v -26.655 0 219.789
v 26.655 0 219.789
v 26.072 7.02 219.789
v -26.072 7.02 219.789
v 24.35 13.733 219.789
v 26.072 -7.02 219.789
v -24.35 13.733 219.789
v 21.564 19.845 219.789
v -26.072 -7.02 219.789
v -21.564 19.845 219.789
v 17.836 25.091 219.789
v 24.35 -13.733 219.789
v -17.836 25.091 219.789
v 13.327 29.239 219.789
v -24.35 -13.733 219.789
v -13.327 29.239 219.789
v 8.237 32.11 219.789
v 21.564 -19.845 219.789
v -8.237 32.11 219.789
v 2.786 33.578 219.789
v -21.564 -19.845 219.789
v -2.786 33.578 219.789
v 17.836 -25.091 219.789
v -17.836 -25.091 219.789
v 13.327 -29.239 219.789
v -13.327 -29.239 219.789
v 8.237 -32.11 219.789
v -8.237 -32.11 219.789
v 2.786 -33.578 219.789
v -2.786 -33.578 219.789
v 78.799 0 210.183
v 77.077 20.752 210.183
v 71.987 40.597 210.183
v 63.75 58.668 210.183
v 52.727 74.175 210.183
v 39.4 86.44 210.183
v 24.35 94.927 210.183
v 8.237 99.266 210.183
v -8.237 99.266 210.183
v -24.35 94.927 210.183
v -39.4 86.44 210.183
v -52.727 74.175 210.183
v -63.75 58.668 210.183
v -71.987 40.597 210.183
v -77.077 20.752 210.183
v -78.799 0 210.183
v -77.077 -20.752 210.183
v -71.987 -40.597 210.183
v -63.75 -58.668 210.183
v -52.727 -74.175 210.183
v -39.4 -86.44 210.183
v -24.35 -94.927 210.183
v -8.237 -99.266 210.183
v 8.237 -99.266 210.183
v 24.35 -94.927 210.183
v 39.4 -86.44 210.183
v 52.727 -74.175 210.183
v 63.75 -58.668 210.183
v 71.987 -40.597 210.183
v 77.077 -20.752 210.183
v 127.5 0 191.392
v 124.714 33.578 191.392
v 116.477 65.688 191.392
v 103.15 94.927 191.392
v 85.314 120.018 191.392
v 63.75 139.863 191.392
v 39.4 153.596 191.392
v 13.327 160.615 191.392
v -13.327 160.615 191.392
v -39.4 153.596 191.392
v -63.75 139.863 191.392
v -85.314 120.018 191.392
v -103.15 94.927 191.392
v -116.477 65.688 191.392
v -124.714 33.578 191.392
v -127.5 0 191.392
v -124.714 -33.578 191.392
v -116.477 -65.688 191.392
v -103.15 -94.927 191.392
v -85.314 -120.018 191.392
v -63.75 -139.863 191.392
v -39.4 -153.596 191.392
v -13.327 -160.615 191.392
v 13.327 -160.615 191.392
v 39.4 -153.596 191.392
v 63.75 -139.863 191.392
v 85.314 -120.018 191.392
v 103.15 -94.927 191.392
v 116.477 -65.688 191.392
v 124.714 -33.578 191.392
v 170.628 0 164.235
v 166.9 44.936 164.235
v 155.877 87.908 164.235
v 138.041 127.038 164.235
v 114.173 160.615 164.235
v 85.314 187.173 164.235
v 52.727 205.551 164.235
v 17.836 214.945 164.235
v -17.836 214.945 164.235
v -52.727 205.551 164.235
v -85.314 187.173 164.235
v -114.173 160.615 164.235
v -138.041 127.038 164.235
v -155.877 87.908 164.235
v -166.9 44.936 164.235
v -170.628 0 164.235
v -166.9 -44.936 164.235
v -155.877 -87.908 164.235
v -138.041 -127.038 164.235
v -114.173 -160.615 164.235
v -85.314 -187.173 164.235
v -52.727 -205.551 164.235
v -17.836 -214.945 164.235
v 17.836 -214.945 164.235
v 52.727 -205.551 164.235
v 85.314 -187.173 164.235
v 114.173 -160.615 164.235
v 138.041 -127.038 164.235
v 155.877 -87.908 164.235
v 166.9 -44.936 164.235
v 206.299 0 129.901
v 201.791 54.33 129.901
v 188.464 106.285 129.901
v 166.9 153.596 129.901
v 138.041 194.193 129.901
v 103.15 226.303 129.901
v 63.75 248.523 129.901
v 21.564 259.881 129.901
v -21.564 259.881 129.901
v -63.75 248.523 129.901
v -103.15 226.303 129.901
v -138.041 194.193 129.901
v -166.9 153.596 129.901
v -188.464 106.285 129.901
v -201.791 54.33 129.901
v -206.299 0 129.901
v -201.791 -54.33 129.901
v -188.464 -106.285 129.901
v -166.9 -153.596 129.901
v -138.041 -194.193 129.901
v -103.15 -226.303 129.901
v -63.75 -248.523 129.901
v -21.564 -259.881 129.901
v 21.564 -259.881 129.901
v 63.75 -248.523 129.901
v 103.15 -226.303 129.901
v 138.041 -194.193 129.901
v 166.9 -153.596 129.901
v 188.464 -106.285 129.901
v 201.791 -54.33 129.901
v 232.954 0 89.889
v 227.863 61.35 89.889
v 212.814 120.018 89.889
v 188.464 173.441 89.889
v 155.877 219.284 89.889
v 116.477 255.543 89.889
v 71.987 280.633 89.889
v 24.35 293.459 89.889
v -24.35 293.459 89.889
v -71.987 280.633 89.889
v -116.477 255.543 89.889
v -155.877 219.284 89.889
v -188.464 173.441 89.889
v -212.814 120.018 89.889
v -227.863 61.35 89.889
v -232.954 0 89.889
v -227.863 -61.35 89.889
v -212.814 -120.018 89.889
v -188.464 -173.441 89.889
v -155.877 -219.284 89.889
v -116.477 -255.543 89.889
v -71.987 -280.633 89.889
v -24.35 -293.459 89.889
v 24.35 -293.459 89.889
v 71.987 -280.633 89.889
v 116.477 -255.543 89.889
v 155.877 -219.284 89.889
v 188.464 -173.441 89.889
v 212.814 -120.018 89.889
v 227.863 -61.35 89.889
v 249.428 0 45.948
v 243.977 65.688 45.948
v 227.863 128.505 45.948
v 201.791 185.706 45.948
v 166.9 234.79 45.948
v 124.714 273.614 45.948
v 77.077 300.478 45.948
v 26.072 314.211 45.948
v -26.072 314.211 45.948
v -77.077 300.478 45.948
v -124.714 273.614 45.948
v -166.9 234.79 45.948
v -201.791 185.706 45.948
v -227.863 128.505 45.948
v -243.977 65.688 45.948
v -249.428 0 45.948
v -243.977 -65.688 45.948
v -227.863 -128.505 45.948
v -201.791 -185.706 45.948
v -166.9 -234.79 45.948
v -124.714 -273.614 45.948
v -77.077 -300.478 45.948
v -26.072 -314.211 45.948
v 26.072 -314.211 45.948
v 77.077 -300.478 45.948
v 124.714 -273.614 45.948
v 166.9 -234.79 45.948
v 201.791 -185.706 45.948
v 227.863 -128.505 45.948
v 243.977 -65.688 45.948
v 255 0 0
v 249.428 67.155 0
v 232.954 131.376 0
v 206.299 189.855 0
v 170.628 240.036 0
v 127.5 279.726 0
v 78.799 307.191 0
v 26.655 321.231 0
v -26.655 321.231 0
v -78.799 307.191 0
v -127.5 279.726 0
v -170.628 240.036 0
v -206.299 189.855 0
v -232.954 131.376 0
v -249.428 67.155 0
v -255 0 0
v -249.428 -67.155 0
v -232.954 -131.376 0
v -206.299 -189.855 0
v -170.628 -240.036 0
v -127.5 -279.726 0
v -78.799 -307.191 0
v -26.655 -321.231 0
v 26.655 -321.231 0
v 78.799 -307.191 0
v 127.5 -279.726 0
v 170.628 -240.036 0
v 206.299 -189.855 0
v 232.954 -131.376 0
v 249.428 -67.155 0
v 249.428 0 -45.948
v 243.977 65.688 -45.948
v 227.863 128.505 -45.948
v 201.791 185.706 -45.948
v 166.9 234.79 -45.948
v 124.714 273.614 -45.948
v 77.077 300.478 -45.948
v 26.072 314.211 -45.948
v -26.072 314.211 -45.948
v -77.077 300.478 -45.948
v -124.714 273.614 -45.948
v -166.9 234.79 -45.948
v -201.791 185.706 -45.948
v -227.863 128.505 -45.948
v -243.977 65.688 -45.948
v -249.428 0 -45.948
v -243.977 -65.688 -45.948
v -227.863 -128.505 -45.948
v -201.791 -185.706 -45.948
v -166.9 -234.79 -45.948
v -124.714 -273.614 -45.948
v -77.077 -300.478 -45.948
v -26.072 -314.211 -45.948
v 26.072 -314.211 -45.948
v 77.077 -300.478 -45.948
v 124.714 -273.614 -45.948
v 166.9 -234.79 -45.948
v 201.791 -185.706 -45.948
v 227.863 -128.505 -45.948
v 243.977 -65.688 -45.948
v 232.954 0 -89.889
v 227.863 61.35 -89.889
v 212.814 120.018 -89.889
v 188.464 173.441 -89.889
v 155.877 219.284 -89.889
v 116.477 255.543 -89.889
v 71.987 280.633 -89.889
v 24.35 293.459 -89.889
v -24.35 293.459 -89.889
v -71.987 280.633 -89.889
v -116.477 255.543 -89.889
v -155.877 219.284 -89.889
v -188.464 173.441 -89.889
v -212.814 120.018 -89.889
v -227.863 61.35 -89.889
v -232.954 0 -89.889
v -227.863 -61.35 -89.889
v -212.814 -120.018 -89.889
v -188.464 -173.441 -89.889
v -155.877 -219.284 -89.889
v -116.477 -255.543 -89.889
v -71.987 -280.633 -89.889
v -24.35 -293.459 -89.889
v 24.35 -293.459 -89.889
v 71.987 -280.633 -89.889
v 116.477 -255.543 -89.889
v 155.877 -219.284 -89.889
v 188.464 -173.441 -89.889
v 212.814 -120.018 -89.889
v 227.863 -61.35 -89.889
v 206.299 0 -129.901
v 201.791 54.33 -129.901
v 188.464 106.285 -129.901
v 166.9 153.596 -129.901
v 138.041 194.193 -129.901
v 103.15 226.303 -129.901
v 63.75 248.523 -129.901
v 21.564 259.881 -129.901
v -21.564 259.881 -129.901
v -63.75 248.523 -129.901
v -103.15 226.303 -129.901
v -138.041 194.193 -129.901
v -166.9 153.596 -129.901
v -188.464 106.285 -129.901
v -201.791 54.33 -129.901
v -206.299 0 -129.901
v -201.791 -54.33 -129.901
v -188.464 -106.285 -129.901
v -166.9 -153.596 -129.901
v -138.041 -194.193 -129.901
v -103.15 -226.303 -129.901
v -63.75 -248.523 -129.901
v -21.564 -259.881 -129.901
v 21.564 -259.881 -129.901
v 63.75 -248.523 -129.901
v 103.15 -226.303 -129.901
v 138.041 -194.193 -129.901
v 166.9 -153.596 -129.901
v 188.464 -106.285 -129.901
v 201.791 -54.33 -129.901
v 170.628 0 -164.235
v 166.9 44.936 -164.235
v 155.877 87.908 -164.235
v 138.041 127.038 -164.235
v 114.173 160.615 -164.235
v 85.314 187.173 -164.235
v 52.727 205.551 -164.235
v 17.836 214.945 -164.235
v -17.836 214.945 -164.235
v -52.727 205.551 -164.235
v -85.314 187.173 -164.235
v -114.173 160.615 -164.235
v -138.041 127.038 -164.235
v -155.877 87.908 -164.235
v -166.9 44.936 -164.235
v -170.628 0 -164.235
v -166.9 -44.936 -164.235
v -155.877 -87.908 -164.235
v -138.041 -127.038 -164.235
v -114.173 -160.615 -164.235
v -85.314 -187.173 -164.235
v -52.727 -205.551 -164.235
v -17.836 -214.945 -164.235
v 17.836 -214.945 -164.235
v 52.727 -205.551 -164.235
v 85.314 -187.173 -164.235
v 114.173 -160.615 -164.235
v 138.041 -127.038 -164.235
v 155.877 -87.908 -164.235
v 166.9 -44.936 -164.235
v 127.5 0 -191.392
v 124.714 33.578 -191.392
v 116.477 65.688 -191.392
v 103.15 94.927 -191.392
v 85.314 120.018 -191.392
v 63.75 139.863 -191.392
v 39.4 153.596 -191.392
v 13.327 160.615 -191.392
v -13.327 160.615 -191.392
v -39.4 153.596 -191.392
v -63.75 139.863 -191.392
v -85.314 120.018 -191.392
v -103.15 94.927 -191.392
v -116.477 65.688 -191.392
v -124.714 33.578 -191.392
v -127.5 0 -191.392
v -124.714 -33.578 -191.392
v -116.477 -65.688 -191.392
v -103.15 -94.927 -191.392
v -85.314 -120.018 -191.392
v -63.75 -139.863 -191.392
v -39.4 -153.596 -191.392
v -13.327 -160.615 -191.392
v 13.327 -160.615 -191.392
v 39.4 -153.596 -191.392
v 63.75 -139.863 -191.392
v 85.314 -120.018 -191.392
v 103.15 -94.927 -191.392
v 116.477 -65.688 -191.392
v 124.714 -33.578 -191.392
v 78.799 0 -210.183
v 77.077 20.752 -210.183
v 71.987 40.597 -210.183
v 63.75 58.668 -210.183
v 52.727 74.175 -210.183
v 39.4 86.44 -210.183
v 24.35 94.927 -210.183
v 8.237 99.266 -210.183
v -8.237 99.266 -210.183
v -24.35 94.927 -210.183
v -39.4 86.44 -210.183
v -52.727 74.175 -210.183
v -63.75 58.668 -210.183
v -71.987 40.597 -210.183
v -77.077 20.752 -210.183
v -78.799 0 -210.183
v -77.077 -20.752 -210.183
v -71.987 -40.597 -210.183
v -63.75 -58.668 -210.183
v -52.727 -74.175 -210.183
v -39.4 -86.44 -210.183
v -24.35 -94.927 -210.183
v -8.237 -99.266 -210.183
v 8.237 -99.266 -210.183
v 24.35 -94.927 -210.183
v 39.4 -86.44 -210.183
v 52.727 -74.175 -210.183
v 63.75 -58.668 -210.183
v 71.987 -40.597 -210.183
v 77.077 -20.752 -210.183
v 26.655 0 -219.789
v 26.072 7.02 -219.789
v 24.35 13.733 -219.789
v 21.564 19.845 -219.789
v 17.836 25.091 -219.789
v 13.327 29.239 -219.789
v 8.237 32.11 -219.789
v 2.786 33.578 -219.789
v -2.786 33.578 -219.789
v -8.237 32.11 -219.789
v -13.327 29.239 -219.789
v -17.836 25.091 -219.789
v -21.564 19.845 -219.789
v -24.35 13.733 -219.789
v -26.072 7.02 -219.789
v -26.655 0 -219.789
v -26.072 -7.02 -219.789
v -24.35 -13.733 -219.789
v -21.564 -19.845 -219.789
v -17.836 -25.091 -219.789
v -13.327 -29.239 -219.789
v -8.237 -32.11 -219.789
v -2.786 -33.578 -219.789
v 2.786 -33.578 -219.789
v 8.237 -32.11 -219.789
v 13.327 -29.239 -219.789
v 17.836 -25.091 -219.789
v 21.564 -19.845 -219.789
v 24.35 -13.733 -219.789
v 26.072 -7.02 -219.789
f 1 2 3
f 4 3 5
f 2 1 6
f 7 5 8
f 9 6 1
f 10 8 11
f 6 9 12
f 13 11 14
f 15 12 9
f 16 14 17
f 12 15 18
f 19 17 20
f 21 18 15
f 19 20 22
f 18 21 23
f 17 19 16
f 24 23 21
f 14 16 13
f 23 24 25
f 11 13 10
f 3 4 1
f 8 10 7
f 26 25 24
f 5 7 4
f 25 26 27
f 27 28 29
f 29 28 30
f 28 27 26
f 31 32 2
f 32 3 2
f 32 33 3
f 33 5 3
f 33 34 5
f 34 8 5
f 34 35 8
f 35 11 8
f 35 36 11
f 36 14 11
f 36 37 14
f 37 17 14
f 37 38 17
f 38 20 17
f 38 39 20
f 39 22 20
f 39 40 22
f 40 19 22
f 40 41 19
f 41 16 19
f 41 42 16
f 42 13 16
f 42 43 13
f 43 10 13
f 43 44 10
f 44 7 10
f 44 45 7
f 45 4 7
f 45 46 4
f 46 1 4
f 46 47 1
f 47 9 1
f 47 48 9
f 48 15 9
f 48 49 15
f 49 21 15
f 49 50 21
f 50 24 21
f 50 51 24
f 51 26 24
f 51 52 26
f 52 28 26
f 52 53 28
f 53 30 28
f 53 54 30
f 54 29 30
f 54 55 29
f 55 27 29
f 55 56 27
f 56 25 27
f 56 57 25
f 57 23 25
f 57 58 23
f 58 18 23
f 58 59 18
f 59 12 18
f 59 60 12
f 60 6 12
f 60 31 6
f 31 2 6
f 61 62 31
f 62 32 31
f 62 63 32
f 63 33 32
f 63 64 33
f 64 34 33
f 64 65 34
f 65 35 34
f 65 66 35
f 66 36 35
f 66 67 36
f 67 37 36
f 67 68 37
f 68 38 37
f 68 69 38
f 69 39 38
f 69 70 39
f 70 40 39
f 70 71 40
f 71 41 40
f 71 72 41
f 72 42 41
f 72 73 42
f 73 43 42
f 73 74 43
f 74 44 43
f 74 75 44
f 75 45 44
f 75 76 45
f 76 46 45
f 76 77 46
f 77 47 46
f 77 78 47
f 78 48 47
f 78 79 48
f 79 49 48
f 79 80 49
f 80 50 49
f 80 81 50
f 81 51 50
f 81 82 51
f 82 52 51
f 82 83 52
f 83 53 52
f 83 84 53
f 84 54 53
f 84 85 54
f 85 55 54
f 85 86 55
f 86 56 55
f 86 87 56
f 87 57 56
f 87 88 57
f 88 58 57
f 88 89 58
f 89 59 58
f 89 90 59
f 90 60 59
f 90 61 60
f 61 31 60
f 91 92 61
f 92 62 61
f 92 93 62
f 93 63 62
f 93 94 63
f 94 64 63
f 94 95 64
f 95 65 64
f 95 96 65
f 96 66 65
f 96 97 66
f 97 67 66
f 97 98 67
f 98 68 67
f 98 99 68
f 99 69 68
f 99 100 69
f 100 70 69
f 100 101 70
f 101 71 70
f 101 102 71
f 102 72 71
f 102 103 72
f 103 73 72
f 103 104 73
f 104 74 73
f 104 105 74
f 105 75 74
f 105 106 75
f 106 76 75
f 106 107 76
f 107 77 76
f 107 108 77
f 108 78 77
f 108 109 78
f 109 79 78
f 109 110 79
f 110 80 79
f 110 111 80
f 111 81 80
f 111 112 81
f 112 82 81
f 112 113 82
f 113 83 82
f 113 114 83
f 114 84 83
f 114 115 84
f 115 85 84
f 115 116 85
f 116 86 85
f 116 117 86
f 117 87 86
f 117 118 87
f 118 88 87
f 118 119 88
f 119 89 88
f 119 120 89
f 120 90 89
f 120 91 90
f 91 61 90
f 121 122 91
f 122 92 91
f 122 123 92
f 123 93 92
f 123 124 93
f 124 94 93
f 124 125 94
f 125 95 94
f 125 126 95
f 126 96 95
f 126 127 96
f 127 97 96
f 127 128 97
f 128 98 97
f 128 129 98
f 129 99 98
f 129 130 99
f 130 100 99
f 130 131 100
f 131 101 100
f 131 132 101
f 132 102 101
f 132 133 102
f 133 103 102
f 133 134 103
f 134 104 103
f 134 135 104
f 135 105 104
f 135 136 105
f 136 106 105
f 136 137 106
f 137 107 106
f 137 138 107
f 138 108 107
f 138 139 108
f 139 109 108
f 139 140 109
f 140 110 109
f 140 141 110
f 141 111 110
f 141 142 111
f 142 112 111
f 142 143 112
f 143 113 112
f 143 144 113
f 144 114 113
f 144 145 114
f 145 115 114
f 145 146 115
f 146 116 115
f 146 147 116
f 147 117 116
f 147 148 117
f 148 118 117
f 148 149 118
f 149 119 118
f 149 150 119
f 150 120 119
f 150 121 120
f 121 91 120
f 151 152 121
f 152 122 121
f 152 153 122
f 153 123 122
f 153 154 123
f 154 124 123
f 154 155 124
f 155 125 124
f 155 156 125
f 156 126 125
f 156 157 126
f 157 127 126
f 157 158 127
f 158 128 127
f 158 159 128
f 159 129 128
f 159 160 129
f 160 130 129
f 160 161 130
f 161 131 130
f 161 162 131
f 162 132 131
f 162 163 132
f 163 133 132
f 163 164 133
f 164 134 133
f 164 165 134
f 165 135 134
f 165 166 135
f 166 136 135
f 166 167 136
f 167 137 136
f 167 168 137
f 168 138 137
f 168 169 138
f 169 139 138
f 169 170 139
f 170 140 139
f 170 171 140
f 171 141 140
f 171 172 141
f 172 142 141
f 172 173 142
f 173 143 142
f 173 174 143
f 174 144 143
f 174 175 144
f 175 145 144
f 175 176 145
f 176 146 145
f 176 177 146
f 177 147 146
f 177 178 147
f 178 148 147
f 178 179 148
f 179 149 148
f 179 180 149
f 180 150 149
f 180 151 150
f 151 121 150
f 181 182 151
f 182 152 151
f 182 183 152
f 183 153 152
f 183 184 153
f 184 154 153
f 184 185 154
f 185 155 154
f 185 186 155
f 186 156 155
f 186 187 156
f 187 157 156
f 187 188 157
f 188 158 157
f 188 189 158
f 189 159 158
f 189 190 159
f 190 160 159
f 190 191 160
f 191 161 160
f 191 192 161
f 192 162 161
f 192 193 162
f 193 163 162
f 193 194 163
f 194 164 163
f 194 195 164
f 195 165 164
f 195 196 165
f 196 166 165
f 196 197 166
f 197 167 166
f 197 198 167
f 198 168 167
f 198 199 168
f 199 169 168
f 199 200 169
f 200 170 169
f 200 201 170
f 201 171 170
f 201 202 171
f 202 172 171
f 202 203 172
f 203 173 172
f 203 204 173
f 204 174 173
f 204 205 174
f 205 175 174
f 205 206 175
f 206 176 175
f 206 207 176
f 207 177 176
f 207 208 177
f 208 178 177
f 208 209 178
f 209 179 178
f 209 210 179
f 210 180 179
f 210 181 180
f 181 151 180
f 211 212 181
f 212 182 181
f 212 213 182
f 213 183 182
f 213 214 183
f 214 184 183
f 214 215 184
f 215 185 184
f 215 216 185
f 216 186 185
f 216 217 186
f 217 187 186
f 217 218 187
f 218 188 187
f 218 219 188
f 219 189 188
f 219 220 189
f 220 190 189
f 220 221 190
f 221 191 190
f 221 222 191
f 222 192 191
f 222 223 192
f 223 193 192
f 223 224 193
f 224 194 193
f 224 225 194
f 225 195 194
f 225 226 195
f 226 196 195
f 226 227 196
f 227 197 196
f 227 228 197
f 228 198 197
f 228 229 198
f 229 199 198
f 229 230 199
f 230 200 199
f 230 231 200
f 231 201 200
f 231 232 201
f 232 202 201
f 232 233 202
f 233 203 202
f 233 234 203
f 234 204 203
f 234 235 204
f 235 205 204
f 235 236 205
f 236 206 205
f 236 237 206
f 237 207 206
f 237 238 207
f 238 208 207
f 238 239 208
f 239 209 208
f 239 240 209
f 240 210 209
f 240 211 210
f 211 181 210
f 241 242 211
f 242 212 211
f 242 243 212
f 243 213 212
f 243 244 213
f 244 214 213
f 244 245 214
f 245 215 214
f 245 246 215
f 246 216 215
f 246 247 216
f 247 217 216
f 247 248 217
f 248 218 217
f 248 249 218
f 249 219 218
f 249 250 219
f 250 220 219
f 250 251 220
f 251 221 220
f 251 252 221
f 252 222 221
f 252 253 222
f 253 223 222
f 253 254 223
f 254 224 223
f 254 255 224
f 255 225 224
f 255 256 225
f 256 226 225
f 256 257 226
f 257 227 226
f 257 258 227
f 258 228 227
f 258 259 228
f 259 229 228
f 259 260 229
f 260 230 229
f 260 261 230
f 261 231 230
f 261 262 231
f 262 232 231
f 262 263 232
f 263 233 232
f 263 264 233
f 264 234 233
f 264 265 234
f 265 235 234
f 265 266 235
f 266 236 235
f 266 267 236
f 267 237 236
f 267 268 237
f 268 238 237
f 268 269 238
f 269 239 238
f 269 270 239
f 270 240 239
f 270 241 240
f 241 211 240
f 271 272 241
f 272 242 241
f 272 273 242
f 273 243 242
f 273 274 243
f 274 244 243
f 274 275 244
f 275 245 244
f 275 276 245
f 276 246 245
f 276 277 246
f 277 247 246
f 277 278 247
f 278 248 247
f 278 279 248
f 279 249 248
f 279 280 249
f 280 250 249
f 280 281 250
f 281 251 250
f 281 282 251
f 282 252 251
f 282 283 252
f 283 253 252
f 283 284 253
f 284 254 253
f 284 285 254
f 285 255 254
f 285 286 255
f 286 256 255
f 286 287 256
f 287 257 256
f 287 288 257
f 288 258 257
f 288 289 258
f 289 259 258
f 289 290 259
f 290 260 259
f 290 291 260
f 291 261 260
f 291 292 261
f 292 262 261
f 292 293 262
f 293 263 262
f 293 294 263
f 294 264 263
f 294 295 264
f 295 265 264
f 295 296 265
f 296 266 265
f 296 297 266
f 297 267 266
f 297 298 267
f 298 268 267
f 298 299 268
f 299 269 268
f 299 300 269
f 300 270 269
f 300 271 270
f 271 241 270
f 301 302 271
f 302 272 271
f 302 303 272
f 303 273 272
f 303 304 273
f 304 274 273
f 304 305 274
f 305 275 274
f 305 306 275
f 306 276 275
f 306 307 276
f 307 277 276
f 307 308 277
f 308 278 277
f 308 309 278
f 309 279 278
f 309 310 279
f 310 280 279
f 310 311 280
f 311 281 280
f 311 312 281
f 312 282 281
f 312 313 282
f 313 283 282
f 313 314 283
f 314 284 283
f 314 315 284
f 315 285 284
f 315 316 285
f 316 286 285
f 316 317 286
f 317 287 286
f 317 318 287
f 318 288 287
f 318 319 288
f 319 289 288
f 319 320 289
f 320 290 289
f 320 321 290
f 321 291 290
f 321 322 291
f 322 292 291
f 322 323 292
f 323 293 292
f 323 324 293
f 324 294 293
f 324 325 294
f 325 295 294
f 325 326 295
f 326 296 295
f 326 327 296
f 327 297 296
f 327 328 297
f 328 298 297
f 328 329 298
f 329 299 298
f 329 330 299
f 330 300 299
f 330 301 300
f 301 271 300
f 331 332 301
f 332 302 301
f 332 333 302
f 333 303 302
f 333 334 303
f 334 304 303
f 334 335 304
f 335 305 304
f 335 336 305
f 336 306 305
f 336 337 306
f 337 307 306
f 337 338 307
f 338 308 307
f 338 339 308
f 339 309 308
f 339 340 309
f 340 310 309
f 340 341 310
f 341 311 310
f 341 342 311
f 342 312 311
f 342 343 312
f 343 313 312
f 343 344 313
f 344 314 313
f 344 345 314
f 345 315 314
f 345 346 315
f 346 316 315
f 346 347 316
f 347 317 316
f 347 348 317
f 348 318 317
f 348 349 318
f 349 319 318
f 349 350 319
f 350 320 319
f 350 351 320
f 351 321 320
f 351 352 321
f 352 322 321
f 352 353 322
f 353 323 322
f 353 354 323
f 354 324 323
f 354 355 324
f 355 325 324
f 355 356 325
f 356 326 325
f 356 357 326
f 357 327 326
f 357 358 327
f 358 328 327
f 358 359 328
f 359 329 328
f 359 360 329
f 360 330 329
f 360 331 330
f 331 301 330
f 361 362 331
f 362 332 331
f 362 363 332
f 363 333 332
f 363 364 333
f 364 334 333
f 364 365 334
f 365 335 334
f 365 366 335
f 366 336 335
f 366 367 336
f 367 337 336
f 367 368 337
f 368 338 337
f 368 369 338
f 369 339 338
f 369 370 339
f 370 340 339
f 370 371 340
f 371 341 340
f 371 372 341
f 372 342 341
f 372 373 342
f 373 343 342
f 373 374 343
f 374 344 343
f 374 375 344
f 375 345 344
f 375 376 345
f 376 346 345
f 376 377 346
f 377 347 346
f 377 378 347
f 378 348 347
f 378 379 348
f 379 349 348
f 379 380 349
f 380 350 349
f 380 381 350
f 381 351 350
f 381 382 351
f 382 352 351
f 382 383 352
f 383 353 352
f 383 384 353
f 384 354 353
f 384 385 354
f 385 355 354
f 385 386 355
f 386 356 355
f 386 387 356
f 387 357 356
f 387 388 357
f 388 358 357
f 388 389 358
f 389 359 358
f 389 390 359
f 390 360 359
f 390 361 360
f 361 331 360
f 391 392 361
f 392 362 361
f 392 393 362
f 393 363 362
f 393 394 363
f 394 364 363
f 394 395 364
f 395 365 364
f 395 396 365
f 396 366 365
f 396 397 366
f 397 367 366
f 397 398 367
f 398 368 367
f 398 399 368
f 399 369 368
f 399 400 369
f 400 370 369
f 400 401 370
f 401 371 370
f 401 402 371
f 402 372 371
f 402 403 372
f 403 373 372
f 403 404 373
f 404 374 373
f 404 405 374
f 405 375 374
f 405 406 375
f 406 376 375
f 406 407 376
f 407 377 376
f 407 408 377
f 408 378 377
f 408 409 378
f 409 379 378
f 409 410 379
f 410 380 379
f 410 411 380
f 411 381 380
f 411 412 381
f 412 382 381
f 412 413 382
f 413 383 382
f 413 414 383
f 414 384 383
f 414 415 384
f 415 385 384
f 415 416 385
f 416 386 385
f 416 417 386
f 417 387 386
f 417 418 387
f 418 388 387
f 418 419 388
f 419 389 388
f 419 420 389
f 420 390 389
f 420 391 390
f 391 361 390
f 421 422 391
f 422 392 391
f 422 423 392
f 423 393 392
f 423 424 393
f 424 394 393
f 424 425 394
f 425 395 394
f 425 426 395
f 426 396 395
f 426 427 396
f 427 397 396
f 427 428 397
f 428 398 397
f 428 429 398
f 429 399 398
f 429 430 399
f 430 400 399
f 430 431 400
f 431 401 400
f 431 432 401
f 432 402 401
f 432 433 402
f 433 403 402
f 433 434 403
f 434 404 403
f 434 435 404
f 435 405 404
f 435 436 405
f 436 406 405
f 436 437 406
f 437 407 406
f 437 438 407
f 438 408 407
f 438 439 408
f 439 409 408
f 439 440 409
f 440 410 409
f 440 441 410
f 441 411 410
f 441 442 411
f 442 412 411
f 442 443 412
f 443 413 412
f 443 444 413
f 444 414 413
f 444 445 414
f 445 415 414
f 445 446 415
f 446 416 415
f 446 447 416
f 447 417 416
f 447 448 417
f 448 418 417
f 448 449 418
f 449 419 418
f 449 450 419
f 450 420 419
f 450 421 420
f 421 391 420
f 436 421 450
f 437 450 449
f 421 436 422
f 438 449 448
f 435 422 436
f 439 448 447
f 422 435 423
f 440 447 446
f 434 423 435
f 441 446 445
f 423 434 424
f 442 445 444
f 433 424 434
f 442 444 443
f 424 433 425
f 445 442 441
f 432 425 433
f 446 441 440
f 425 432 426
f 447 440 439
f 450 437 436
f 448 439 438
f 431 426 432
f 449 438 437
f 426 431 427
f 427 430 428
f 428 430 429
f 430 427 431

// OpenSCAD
// Generated by SolidPython 1.0.1 on 2020-07-29 00:46:52


scale(v = [15, 19, 13]) {
	sphere(r = 17);
}
/***********************************************
*********      SolidPython code:      **********
************************************************
 
# import packages: SolidPython
from solid import *
from solid.utils import *
from itertools import chain, combinations, permutations


class Resize:

    def __init__(self, scad_file):
        self.scad_file = scad_file
        #self.scad_file = import_scad(scad_file)
        # cone/cylinder param:
        self.r1 = 0
        self.r2 = 0
        self.h = 0
        # rectangular prism param:
        self.w = 0
        self.l = 0
        # ellipse param:
        self.r = 0

    # import OpenScad code (file name corresponds to shape)


    # classify shape + parameters
    def assign(self, param1, param2, param3):
        if self.scad_file == 'cone.scad':
            self.r1 = param1
            self.r2 = param2
            self.h = param3
        elif self.scad_file == 'cylinder.scad':
            self.r1 = param1
            self.r2 = param2
            self.h = param3
        elif self.scad_file == 'rectangularPrism.scad':
            self.h = param1
            self.l = param2
            self.w = param3
        else:
            self.r = param1
            self.h = param2

    # resize parameters
    def iterate(self):
        x = range(3, 20, 2)
        i = 1
        if self.scad_file == 'cone.scad':
            tempList = list(permutations(x, 2))
            for temp in tempList:
                param1 = temp[0]
                param2 = temp[1]
                filepath = 'produced_scad_files/' + 'cone' + str(param1) + '_' + str(param2) + '_' + '.scad'
                scad_render_to_file(cylinder(h=param1, r1=param2, r2=0), filepath)

        elif self.scad_file == 'cylinder.scad':
            tempList = list(permutations(x, 3))
            for temp in tempList:
                param1 = temp[0]
                param2 = temp[1]
                filepath = 'produced_scad_files/' + 'cylinder' + str(param1) + '_' + str(param2) + '_' + '.scad'
                scad_render_to_file(cylinder(h=param1, r1=param2, r2=param2), filepath)

        elif self.scad_file == 'rectangularPrism.scad':
            tempList = list(permutations(x, 3))
            for temp in tempList:
                param1 = temp[0]
                param2 = temp[1]
                param3 = temp[2]
                filepath = 'produced_scad_files/' + 'rectangularPrism' + str(param1) + '_' + str(param2) + '_' + str(
                    param3) + '.scad'
                scad_render_to_file(cube(size=(param1, param2, param3)), filepath)

        elif self.scad_file == 'ellipse.scad':
            tempList = list(permutations(x, 4))
            for temp in tempList:
                param1 = temp[0]
                param2 = temp[1]
                param3 = temp[2]
                param4 = temp[3]
                filepath = 'produced_scad_files/' + 'ellipse' + str(param1) + '_' + str(param2) + '_' + str(param3) + '_' + str(param4) + '.scad'
                scad_render_to_file(scale([param1, param2, param3])(sphere(r=param4)), filepath)

    def render_to_scadfile(self):
        scad_render_to_file(scad, 'example.scad') 
 
************************************************/
